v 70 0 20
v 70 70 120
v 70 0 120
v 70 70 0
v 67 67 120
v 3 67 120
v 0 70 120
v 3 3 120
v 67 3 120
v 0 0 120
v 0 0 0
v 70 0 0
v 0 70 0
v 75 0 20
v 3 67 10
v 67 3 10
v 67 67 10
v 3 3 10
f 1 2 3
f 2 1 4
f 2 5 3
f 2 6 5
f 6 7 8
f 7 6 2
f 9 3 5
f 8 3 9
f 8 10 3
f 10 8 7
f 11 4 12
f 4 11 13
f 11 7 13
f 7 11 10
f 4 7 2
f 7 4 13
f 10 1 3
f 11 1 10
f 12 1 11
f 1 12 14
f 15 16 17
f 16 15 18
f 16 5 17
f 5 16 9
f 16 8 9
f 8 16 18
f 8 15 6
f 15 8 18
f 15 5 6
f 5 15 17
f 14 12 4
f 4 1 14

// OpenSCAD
// Bottom width
bw = 10;
// Wall width
ww = 3;
ch = 120;
// Cup length/width
cw = 70;
difference() {
// Outer cube
cube([cw, cw, ch]);
    
// Hollowed out cube
translate([0, 0, bw])
linear_extrude(ch)
    offset(delta = -ww)
        square([cw, cw]);
}

// Good start
translate([70, 0, 0])
polyhedron(
    points=[
        [0, 0, 0], // 0
        [0, cw, 0], // 1
        [0, 0, 20], // 2
        [5, 0, 20]], // 3
    faces=[[0, 3, 2], [0, 1, 3], [3, 1, 2], [0, 2, 1]]
);

translate([70, 0, 0])
polyhedron(
    points=[
        [0, cw, 0], // 0
        [0, 0, 20], // 1
        [5, 0, 20], // 2
        [0, cw, 80], // 3
        [10, 40, 60], // 4
        [0, 0, 80]], // 5
    faces=[[5, 2, 1], [4, 0, 2], [5, 4, 2], [5, 3, 4], [3, 0, 4], [3, 5, 1, 0]]
);
